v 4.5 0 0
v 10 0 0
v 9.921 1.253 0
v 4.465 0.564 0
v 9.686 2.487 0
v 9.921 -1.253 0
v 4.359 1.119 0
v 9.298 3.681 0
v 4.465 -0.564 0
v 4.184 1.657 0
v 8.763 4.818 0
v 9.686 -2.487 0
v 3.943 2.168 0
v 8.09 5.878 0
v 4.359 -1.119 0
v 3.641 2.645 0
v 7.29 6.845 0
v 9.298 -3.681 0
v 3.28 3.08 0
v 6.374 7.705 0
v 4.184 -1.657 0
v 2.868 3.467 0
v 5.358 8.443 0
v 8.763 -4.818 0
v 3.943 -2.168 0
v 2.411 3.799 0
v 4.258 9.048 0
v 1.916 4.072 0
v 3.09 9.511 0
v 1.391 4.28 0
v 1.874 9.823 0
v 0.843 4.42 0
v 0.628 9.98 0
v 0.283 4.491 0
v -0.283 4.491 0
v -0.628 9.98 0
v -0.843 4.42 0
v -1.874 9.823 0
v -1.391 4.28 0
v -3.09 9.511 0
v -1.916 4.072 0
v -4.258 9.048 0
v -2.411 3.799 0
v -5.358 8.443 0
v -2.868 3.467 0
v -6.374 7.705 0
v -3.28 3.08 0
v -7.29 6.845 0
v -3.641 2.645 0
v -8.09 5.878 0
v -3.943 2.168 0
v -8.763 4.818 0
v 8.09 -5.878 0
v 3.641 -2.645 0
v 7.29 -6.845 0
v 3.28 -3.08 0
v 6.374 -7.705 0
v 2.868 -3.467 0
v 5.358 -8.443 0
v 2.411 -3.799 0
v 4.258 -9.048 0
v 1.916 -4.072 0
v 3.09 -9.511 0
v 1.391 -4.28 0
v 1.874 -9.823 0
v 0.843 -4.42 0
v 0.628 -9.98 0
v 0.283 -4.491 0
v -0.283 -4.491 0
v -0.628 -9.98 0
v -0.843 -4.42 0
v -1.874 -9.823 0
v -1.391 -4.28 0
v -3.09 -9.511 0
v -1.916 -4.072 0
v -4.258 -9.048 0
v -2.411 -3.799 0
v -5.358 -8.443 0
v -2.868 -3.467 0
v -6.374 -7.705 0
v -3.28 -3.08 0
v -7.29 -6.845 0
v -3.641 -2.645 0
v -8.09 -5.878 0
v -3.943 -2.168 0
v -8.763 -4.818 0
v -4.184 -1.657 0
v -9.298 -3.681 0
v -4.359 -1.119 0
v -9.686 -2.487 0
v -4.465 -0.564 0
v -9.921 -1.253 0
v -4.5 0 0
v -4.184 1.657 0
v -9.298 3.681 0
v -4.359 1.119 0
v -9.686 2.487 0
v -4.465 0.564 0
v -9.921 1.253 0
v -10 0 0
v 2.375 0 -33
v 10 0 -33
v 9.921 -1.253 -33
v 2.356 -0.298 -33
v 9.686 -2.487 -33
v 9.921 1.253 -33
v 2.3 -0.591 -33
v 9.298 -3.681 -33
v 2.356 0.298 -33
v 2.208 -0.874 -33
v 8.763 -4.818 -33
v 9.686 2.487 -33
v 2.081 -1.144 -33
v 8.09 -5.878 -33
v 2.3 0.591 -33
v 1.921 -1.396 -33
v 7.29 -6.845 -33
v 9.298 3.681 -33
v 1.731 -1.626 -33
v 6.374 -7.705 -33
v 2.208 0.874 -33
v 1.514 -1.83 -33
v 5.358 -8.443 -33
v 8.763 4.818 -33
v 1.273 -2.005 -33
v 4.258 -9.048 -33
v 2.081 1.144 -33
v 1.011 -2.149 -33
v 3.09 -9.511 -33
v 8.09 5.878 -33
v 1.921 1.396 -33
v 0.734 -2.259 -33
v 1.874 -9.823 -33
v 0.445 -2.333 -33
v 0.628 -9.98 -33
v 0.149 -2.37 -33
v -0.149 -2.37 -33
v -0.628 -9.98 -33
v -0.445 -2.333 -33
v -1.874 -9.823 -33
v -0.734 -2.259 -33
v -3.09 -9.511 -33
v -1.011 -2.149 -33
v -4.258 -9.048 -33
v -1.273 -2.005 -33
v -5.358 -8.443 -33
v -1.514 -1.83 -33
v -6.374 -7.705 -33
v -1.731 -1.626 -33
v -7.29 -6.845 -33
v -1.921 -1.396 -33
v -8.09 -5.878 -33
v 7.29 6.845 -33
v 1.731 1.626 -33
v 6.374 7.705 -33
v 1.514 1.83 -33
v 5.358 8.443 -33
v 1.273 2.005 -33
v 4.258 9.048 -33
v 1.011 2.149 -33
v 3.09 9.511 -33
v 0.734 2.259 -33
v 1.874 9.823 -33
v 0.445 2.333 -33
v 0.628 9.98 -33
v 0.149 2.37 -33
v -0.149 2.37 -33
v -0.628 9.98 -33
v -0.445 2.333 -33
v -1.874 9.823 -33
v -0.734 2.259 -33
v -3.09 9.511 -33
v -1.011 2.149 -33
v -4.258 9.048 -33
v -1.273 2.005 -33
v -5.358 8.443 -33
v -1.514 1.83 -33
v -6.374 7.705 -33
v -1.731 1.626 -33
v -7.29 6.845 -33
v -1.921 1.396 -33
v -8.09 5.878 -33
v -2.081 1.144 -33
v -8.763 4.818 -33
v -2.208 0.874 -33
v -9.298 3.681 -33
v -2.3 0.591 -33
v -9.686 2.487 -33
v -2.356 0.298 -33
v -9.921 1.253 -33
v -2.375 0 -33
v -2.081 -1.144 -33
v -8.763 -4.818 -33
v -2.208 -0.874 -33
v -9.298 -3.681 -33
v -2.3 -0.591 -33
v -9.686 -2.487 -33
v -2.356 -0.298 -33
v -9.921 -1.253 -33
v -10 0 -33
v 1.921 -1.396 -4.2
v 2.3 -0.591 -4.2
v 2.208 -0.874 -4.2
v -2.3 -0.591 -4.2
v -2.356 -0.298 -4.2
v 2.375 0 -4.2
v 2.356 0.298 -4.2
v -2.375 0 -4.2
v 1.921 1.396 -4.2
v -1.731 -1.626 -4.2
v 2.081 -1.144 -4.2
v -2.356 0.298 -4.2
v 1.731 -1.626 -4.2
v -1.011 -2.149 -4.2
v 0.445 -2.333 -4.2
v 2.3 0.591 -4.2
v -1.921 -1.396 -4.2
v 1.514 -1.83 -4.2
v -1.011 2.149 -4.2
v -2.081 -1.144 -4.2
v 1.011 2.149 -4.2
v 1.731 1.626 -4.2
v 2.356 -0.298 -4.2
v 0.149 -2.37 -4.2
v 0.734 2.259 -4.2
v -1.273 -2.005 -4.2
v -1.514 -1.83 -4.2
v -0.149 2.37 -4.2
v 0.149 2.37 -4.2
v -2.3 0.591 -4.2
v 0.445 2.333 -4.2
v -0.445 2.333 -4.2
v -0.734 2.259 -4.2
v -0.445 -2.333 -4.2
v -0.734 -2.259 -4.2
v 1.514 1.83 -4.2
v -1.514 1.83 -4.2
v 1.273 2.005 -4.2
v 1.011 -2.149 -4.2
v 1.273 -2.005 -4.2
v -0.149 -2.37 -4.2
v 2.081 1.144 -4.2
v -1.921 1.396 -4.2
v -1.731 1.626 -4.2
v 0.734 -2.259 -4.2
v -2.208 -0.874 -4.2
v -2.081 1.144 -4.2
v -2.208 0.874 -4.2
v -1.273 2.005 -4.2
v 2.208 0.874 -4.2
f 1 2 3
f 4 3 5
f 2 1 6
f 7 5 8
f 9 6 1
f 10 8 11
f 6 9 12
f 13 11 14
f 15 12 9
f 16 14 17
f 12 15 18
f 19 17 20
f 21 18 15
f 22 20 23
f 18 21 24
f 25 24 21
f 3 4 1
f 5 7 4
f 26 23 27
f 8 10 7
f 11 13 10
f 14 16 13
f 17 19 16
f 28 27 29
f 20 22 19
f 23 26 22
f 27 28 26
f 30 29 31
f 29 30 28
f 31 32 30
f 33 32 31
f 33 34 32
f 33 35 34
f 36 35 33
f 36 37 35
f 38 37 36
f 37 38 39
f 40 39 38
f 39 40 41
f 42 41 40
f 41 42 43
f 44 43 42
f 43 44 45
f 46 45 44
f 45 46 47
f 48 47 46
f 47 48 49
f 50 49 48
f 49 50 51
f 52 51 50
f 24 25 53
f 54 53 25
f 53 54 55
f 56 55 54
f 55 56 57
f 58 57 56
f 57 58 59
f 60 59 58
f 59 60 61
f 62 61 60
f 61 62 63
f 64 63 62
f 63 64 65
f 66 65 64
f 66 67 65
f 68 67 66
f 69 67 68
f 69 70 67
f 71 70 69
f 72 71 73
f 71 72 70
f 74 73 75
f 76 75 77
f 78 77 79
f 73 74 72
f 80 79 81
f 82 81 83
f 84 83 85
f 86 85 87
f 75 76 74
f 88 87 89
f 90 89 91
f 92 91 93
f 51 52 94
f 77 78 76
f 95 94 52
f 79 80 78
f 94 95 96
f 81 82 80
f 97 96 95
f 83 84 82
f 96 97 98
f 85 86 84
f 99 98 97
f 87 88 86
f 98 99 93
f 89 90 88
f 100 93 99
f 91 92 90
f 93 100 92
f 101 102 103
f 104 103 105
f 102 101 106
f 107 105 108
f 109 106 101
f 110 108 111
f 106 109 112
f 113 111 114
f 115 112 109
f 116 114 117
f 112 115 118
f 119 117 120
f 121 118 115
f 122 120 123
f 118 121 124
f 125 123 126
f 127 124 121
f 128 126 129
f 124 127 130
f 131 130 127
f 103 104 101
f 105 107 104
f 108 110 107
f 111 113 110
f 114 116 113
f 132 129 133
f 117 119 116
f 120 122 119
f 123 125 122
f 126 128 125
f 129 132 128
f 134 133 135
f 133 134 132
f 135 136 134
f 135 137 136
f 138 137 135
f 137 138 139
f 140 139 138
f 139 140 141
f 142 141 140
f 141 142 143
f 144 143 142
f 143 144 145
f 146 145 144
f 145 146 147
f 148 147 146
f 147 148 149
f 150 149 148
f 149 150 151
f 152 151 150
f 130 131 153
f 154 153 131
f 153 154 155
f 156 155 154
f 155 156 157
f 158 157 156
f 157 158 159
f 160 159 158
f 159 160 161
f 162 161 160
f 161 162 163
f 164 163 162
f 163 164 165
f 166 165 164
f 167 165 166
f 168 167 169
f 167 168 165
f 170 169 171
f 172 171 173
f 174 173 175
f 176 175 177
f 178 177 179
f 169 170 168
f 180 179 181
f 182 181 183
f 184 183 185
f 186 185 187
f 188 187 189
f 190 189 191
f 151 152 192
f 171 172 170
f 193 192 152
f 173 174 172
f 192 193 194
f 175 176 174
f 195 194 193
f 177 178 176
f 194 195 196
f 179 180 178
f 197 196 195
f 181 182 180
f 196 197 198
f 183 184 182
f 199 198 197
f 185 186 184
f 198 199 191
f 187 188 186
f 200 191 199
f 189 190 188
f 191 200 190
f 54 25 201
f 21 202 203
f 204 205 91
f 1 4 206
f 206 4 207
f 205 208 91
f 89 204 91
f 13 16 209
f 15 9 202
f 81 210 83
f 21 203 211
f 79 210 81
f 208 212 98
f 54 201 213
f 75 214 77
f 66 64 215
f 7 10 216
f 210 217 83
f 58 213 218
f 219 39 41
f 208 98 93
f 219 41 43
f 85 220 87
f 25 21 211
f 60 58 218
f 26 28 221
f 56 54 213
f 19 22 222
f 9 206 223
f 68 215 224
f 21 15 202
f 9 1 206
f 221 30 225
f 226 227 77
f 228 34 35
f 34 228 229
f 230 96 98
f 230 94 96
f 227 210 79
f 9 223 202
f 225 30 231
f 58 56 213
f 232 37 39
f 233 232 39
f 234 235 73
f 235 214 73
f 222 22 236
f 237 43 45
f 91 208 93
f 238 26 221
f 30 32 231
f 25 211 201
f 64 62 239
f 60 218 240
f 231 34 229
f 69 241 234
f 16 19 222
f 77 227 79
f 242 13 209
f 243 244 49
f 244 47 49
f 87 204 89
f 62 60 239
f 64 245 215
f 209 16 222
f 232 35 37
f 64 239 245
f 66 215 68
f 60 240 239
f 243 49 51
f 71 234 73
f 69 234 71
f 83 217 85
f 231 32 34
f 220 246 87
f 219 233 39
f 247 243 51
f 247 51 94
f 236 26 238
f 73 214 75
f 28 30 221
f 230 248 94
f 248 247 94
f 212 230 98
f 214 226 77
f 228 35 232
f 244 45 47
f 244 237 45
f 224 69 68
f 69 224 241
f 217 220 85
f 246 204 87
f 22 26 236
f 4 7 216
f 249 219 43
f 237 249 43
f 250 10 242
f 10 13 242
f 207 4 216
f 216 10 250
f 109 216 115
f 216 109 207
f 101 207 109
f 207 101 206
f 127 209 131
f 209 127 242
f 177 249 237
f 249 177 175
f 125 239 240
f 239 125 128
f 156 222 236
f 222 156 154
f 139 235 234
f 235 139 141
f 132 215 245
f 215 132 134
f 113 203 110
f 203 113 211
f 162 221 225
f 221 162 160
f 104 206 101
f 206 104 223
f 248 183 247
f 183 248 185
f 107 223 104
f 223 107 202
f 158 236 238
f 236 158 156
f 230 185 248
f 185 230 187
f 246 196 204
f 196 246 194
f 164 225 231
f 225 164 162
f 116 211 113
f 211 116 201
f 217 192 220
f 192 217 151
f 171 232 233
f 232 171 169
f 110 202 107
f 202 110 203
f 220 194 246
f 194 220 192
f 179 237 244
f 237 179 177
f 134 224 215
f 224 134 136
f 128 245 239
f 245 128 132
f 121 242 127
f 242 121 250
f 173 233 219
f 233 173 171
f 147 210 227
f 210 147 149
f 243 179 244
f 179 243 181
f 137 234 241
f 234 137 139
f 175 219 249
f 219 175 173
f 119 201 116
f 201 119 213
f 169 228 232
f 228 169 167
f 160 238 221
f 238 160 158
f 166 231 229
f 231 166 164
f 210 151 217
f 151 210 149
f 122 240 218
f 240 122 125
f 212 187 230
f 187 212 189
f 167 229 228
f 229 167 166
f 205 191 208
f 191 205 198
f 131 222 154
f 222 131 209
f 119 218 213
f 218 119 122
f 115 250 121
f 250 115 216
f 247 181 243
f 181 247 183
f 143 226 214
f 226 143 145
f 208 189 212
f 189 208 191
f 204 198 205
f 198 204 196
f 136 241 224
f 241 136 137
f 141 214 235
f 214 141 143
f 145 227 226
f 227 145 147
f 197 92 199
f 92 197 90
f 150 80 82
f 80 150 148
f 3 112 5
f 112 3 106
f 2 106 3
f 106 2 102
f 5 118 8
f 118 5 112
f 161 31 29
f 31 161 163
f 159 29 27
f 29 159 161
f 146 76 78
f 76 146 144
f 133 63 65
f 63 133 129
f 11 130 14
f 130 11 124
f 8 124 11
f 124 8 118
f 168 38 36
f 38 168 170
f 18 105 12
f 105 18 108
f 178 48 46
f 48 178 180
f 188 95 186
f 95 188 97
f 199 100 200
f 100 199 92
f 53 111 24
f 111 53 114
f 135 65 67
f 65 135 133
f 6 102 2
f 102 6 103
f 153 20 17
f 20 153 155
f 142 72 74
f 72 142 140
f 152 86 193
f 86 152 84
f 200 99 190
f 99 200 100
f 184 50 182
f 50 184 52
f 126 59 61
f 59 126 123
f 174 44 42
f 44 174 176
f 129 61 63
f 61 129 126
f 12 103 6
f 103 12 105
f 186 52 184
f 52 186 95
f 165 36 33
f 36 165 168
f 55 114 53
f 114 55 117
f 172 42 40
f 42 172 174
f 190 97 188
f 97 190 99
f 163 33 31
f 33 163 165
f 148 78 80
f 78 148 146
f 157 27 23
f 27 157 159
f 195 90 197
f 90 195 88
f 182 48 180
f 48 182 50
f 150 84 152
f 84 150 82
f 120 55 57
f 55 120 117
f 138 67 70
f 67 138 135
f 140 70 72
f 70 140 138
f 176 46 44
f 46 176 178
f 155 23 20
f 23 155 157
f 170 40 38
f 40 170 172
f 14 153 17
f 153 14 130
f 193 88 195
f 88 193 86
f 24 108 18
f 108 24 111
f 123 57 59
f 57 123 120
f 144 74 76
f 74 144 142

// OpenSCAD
$fn = 50;


difference() {
	union() {
		translate(v = [0, 0, -33.0000000000]) {
			cylinder(h = 33, r = 10.0000000000);
		}
		cylinder(h = 0, r = 13.0000000000);
	}
	union() {
		translate(v = [0, 0, 0]) {
			rotate(a = [0, 0, 0]) {
				difference() {
					union() {
						#translate(v = [0, 0, -33.0000000000]) {
							cylinder(h = 33, r = 2.2500000000);
						}
						#translate(v = [0, 0, -4.2000000000]) {
							cylinder(h = 4.2000000000, r = 10.0000000000, r1 = 2.3750000000, r2 = 4.5000000000);
						}
						#translate(v = [0, 0, -33.0000000000]) {
							cylinder(h = 33, r = 2.3750000000);
						}
						#translate(v = [0, 0, -33.0000000000]) {
							cylinder(h = 33, r = 2.2500000000);
						}
					}
					union();
				}
			}
		}
	}
}
